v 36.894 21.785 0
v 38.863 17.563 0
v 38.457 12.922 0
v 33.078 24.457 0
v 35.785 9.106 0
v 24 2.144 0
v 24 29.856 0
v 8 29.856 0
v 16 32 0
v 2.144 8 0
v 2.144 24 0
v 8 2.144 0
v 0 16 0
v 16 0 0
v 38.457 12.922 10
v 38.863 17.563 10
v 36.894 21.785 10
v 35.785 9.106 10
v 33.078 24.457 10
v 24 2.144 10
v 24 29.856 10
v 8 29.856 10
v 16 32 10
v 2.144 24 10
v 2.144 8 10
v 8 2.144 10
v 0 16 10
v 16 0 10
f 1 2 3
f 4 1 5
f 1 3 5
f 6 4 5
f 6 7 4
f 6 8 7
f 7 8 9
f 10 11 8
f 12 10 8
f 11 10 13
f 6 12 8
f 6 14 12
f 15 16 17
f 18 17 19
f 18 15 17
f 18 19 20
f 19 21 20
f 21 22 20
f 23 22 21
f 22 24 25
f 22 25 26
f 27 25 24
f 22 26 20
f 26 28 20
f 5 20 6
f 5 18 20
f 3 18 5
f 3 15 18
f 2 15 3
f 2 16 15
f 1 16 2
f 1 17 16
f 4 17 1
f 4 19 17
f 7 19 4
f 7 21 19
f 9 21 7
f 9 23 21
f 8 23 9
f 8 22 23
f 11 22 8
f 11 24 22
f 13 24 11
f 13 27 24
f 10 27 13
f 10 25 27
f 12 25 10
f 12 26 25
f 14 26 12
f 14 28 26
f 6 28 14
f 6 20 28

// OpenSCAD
$fn = 32;

// ----------------------------------------------------------------------
// Eccentric disc: step, 10 mm thick
// ----------------------------------------------------------------------

// --- parameters (mm) ---
profile_height = 10;      // extrusion height
profile_points = 14;      // points of the closed outline

profile = [[0, 16], [2.144, 8], [8, 2.144], [16, 0], [24, 2.144], [35.785, 9.106], [38.457, 12.922], [38.863, 17.563], [36.894, 21.785], [33.078, 24.457], [24, 29.856], [16, 32], [8, 29.856], [2.144, 24]];  // single closed polygon, 14 points, counter clockwise

// --- the one profile operation ---
linear_extrude(height = profile_height) polygon(points = profile);
